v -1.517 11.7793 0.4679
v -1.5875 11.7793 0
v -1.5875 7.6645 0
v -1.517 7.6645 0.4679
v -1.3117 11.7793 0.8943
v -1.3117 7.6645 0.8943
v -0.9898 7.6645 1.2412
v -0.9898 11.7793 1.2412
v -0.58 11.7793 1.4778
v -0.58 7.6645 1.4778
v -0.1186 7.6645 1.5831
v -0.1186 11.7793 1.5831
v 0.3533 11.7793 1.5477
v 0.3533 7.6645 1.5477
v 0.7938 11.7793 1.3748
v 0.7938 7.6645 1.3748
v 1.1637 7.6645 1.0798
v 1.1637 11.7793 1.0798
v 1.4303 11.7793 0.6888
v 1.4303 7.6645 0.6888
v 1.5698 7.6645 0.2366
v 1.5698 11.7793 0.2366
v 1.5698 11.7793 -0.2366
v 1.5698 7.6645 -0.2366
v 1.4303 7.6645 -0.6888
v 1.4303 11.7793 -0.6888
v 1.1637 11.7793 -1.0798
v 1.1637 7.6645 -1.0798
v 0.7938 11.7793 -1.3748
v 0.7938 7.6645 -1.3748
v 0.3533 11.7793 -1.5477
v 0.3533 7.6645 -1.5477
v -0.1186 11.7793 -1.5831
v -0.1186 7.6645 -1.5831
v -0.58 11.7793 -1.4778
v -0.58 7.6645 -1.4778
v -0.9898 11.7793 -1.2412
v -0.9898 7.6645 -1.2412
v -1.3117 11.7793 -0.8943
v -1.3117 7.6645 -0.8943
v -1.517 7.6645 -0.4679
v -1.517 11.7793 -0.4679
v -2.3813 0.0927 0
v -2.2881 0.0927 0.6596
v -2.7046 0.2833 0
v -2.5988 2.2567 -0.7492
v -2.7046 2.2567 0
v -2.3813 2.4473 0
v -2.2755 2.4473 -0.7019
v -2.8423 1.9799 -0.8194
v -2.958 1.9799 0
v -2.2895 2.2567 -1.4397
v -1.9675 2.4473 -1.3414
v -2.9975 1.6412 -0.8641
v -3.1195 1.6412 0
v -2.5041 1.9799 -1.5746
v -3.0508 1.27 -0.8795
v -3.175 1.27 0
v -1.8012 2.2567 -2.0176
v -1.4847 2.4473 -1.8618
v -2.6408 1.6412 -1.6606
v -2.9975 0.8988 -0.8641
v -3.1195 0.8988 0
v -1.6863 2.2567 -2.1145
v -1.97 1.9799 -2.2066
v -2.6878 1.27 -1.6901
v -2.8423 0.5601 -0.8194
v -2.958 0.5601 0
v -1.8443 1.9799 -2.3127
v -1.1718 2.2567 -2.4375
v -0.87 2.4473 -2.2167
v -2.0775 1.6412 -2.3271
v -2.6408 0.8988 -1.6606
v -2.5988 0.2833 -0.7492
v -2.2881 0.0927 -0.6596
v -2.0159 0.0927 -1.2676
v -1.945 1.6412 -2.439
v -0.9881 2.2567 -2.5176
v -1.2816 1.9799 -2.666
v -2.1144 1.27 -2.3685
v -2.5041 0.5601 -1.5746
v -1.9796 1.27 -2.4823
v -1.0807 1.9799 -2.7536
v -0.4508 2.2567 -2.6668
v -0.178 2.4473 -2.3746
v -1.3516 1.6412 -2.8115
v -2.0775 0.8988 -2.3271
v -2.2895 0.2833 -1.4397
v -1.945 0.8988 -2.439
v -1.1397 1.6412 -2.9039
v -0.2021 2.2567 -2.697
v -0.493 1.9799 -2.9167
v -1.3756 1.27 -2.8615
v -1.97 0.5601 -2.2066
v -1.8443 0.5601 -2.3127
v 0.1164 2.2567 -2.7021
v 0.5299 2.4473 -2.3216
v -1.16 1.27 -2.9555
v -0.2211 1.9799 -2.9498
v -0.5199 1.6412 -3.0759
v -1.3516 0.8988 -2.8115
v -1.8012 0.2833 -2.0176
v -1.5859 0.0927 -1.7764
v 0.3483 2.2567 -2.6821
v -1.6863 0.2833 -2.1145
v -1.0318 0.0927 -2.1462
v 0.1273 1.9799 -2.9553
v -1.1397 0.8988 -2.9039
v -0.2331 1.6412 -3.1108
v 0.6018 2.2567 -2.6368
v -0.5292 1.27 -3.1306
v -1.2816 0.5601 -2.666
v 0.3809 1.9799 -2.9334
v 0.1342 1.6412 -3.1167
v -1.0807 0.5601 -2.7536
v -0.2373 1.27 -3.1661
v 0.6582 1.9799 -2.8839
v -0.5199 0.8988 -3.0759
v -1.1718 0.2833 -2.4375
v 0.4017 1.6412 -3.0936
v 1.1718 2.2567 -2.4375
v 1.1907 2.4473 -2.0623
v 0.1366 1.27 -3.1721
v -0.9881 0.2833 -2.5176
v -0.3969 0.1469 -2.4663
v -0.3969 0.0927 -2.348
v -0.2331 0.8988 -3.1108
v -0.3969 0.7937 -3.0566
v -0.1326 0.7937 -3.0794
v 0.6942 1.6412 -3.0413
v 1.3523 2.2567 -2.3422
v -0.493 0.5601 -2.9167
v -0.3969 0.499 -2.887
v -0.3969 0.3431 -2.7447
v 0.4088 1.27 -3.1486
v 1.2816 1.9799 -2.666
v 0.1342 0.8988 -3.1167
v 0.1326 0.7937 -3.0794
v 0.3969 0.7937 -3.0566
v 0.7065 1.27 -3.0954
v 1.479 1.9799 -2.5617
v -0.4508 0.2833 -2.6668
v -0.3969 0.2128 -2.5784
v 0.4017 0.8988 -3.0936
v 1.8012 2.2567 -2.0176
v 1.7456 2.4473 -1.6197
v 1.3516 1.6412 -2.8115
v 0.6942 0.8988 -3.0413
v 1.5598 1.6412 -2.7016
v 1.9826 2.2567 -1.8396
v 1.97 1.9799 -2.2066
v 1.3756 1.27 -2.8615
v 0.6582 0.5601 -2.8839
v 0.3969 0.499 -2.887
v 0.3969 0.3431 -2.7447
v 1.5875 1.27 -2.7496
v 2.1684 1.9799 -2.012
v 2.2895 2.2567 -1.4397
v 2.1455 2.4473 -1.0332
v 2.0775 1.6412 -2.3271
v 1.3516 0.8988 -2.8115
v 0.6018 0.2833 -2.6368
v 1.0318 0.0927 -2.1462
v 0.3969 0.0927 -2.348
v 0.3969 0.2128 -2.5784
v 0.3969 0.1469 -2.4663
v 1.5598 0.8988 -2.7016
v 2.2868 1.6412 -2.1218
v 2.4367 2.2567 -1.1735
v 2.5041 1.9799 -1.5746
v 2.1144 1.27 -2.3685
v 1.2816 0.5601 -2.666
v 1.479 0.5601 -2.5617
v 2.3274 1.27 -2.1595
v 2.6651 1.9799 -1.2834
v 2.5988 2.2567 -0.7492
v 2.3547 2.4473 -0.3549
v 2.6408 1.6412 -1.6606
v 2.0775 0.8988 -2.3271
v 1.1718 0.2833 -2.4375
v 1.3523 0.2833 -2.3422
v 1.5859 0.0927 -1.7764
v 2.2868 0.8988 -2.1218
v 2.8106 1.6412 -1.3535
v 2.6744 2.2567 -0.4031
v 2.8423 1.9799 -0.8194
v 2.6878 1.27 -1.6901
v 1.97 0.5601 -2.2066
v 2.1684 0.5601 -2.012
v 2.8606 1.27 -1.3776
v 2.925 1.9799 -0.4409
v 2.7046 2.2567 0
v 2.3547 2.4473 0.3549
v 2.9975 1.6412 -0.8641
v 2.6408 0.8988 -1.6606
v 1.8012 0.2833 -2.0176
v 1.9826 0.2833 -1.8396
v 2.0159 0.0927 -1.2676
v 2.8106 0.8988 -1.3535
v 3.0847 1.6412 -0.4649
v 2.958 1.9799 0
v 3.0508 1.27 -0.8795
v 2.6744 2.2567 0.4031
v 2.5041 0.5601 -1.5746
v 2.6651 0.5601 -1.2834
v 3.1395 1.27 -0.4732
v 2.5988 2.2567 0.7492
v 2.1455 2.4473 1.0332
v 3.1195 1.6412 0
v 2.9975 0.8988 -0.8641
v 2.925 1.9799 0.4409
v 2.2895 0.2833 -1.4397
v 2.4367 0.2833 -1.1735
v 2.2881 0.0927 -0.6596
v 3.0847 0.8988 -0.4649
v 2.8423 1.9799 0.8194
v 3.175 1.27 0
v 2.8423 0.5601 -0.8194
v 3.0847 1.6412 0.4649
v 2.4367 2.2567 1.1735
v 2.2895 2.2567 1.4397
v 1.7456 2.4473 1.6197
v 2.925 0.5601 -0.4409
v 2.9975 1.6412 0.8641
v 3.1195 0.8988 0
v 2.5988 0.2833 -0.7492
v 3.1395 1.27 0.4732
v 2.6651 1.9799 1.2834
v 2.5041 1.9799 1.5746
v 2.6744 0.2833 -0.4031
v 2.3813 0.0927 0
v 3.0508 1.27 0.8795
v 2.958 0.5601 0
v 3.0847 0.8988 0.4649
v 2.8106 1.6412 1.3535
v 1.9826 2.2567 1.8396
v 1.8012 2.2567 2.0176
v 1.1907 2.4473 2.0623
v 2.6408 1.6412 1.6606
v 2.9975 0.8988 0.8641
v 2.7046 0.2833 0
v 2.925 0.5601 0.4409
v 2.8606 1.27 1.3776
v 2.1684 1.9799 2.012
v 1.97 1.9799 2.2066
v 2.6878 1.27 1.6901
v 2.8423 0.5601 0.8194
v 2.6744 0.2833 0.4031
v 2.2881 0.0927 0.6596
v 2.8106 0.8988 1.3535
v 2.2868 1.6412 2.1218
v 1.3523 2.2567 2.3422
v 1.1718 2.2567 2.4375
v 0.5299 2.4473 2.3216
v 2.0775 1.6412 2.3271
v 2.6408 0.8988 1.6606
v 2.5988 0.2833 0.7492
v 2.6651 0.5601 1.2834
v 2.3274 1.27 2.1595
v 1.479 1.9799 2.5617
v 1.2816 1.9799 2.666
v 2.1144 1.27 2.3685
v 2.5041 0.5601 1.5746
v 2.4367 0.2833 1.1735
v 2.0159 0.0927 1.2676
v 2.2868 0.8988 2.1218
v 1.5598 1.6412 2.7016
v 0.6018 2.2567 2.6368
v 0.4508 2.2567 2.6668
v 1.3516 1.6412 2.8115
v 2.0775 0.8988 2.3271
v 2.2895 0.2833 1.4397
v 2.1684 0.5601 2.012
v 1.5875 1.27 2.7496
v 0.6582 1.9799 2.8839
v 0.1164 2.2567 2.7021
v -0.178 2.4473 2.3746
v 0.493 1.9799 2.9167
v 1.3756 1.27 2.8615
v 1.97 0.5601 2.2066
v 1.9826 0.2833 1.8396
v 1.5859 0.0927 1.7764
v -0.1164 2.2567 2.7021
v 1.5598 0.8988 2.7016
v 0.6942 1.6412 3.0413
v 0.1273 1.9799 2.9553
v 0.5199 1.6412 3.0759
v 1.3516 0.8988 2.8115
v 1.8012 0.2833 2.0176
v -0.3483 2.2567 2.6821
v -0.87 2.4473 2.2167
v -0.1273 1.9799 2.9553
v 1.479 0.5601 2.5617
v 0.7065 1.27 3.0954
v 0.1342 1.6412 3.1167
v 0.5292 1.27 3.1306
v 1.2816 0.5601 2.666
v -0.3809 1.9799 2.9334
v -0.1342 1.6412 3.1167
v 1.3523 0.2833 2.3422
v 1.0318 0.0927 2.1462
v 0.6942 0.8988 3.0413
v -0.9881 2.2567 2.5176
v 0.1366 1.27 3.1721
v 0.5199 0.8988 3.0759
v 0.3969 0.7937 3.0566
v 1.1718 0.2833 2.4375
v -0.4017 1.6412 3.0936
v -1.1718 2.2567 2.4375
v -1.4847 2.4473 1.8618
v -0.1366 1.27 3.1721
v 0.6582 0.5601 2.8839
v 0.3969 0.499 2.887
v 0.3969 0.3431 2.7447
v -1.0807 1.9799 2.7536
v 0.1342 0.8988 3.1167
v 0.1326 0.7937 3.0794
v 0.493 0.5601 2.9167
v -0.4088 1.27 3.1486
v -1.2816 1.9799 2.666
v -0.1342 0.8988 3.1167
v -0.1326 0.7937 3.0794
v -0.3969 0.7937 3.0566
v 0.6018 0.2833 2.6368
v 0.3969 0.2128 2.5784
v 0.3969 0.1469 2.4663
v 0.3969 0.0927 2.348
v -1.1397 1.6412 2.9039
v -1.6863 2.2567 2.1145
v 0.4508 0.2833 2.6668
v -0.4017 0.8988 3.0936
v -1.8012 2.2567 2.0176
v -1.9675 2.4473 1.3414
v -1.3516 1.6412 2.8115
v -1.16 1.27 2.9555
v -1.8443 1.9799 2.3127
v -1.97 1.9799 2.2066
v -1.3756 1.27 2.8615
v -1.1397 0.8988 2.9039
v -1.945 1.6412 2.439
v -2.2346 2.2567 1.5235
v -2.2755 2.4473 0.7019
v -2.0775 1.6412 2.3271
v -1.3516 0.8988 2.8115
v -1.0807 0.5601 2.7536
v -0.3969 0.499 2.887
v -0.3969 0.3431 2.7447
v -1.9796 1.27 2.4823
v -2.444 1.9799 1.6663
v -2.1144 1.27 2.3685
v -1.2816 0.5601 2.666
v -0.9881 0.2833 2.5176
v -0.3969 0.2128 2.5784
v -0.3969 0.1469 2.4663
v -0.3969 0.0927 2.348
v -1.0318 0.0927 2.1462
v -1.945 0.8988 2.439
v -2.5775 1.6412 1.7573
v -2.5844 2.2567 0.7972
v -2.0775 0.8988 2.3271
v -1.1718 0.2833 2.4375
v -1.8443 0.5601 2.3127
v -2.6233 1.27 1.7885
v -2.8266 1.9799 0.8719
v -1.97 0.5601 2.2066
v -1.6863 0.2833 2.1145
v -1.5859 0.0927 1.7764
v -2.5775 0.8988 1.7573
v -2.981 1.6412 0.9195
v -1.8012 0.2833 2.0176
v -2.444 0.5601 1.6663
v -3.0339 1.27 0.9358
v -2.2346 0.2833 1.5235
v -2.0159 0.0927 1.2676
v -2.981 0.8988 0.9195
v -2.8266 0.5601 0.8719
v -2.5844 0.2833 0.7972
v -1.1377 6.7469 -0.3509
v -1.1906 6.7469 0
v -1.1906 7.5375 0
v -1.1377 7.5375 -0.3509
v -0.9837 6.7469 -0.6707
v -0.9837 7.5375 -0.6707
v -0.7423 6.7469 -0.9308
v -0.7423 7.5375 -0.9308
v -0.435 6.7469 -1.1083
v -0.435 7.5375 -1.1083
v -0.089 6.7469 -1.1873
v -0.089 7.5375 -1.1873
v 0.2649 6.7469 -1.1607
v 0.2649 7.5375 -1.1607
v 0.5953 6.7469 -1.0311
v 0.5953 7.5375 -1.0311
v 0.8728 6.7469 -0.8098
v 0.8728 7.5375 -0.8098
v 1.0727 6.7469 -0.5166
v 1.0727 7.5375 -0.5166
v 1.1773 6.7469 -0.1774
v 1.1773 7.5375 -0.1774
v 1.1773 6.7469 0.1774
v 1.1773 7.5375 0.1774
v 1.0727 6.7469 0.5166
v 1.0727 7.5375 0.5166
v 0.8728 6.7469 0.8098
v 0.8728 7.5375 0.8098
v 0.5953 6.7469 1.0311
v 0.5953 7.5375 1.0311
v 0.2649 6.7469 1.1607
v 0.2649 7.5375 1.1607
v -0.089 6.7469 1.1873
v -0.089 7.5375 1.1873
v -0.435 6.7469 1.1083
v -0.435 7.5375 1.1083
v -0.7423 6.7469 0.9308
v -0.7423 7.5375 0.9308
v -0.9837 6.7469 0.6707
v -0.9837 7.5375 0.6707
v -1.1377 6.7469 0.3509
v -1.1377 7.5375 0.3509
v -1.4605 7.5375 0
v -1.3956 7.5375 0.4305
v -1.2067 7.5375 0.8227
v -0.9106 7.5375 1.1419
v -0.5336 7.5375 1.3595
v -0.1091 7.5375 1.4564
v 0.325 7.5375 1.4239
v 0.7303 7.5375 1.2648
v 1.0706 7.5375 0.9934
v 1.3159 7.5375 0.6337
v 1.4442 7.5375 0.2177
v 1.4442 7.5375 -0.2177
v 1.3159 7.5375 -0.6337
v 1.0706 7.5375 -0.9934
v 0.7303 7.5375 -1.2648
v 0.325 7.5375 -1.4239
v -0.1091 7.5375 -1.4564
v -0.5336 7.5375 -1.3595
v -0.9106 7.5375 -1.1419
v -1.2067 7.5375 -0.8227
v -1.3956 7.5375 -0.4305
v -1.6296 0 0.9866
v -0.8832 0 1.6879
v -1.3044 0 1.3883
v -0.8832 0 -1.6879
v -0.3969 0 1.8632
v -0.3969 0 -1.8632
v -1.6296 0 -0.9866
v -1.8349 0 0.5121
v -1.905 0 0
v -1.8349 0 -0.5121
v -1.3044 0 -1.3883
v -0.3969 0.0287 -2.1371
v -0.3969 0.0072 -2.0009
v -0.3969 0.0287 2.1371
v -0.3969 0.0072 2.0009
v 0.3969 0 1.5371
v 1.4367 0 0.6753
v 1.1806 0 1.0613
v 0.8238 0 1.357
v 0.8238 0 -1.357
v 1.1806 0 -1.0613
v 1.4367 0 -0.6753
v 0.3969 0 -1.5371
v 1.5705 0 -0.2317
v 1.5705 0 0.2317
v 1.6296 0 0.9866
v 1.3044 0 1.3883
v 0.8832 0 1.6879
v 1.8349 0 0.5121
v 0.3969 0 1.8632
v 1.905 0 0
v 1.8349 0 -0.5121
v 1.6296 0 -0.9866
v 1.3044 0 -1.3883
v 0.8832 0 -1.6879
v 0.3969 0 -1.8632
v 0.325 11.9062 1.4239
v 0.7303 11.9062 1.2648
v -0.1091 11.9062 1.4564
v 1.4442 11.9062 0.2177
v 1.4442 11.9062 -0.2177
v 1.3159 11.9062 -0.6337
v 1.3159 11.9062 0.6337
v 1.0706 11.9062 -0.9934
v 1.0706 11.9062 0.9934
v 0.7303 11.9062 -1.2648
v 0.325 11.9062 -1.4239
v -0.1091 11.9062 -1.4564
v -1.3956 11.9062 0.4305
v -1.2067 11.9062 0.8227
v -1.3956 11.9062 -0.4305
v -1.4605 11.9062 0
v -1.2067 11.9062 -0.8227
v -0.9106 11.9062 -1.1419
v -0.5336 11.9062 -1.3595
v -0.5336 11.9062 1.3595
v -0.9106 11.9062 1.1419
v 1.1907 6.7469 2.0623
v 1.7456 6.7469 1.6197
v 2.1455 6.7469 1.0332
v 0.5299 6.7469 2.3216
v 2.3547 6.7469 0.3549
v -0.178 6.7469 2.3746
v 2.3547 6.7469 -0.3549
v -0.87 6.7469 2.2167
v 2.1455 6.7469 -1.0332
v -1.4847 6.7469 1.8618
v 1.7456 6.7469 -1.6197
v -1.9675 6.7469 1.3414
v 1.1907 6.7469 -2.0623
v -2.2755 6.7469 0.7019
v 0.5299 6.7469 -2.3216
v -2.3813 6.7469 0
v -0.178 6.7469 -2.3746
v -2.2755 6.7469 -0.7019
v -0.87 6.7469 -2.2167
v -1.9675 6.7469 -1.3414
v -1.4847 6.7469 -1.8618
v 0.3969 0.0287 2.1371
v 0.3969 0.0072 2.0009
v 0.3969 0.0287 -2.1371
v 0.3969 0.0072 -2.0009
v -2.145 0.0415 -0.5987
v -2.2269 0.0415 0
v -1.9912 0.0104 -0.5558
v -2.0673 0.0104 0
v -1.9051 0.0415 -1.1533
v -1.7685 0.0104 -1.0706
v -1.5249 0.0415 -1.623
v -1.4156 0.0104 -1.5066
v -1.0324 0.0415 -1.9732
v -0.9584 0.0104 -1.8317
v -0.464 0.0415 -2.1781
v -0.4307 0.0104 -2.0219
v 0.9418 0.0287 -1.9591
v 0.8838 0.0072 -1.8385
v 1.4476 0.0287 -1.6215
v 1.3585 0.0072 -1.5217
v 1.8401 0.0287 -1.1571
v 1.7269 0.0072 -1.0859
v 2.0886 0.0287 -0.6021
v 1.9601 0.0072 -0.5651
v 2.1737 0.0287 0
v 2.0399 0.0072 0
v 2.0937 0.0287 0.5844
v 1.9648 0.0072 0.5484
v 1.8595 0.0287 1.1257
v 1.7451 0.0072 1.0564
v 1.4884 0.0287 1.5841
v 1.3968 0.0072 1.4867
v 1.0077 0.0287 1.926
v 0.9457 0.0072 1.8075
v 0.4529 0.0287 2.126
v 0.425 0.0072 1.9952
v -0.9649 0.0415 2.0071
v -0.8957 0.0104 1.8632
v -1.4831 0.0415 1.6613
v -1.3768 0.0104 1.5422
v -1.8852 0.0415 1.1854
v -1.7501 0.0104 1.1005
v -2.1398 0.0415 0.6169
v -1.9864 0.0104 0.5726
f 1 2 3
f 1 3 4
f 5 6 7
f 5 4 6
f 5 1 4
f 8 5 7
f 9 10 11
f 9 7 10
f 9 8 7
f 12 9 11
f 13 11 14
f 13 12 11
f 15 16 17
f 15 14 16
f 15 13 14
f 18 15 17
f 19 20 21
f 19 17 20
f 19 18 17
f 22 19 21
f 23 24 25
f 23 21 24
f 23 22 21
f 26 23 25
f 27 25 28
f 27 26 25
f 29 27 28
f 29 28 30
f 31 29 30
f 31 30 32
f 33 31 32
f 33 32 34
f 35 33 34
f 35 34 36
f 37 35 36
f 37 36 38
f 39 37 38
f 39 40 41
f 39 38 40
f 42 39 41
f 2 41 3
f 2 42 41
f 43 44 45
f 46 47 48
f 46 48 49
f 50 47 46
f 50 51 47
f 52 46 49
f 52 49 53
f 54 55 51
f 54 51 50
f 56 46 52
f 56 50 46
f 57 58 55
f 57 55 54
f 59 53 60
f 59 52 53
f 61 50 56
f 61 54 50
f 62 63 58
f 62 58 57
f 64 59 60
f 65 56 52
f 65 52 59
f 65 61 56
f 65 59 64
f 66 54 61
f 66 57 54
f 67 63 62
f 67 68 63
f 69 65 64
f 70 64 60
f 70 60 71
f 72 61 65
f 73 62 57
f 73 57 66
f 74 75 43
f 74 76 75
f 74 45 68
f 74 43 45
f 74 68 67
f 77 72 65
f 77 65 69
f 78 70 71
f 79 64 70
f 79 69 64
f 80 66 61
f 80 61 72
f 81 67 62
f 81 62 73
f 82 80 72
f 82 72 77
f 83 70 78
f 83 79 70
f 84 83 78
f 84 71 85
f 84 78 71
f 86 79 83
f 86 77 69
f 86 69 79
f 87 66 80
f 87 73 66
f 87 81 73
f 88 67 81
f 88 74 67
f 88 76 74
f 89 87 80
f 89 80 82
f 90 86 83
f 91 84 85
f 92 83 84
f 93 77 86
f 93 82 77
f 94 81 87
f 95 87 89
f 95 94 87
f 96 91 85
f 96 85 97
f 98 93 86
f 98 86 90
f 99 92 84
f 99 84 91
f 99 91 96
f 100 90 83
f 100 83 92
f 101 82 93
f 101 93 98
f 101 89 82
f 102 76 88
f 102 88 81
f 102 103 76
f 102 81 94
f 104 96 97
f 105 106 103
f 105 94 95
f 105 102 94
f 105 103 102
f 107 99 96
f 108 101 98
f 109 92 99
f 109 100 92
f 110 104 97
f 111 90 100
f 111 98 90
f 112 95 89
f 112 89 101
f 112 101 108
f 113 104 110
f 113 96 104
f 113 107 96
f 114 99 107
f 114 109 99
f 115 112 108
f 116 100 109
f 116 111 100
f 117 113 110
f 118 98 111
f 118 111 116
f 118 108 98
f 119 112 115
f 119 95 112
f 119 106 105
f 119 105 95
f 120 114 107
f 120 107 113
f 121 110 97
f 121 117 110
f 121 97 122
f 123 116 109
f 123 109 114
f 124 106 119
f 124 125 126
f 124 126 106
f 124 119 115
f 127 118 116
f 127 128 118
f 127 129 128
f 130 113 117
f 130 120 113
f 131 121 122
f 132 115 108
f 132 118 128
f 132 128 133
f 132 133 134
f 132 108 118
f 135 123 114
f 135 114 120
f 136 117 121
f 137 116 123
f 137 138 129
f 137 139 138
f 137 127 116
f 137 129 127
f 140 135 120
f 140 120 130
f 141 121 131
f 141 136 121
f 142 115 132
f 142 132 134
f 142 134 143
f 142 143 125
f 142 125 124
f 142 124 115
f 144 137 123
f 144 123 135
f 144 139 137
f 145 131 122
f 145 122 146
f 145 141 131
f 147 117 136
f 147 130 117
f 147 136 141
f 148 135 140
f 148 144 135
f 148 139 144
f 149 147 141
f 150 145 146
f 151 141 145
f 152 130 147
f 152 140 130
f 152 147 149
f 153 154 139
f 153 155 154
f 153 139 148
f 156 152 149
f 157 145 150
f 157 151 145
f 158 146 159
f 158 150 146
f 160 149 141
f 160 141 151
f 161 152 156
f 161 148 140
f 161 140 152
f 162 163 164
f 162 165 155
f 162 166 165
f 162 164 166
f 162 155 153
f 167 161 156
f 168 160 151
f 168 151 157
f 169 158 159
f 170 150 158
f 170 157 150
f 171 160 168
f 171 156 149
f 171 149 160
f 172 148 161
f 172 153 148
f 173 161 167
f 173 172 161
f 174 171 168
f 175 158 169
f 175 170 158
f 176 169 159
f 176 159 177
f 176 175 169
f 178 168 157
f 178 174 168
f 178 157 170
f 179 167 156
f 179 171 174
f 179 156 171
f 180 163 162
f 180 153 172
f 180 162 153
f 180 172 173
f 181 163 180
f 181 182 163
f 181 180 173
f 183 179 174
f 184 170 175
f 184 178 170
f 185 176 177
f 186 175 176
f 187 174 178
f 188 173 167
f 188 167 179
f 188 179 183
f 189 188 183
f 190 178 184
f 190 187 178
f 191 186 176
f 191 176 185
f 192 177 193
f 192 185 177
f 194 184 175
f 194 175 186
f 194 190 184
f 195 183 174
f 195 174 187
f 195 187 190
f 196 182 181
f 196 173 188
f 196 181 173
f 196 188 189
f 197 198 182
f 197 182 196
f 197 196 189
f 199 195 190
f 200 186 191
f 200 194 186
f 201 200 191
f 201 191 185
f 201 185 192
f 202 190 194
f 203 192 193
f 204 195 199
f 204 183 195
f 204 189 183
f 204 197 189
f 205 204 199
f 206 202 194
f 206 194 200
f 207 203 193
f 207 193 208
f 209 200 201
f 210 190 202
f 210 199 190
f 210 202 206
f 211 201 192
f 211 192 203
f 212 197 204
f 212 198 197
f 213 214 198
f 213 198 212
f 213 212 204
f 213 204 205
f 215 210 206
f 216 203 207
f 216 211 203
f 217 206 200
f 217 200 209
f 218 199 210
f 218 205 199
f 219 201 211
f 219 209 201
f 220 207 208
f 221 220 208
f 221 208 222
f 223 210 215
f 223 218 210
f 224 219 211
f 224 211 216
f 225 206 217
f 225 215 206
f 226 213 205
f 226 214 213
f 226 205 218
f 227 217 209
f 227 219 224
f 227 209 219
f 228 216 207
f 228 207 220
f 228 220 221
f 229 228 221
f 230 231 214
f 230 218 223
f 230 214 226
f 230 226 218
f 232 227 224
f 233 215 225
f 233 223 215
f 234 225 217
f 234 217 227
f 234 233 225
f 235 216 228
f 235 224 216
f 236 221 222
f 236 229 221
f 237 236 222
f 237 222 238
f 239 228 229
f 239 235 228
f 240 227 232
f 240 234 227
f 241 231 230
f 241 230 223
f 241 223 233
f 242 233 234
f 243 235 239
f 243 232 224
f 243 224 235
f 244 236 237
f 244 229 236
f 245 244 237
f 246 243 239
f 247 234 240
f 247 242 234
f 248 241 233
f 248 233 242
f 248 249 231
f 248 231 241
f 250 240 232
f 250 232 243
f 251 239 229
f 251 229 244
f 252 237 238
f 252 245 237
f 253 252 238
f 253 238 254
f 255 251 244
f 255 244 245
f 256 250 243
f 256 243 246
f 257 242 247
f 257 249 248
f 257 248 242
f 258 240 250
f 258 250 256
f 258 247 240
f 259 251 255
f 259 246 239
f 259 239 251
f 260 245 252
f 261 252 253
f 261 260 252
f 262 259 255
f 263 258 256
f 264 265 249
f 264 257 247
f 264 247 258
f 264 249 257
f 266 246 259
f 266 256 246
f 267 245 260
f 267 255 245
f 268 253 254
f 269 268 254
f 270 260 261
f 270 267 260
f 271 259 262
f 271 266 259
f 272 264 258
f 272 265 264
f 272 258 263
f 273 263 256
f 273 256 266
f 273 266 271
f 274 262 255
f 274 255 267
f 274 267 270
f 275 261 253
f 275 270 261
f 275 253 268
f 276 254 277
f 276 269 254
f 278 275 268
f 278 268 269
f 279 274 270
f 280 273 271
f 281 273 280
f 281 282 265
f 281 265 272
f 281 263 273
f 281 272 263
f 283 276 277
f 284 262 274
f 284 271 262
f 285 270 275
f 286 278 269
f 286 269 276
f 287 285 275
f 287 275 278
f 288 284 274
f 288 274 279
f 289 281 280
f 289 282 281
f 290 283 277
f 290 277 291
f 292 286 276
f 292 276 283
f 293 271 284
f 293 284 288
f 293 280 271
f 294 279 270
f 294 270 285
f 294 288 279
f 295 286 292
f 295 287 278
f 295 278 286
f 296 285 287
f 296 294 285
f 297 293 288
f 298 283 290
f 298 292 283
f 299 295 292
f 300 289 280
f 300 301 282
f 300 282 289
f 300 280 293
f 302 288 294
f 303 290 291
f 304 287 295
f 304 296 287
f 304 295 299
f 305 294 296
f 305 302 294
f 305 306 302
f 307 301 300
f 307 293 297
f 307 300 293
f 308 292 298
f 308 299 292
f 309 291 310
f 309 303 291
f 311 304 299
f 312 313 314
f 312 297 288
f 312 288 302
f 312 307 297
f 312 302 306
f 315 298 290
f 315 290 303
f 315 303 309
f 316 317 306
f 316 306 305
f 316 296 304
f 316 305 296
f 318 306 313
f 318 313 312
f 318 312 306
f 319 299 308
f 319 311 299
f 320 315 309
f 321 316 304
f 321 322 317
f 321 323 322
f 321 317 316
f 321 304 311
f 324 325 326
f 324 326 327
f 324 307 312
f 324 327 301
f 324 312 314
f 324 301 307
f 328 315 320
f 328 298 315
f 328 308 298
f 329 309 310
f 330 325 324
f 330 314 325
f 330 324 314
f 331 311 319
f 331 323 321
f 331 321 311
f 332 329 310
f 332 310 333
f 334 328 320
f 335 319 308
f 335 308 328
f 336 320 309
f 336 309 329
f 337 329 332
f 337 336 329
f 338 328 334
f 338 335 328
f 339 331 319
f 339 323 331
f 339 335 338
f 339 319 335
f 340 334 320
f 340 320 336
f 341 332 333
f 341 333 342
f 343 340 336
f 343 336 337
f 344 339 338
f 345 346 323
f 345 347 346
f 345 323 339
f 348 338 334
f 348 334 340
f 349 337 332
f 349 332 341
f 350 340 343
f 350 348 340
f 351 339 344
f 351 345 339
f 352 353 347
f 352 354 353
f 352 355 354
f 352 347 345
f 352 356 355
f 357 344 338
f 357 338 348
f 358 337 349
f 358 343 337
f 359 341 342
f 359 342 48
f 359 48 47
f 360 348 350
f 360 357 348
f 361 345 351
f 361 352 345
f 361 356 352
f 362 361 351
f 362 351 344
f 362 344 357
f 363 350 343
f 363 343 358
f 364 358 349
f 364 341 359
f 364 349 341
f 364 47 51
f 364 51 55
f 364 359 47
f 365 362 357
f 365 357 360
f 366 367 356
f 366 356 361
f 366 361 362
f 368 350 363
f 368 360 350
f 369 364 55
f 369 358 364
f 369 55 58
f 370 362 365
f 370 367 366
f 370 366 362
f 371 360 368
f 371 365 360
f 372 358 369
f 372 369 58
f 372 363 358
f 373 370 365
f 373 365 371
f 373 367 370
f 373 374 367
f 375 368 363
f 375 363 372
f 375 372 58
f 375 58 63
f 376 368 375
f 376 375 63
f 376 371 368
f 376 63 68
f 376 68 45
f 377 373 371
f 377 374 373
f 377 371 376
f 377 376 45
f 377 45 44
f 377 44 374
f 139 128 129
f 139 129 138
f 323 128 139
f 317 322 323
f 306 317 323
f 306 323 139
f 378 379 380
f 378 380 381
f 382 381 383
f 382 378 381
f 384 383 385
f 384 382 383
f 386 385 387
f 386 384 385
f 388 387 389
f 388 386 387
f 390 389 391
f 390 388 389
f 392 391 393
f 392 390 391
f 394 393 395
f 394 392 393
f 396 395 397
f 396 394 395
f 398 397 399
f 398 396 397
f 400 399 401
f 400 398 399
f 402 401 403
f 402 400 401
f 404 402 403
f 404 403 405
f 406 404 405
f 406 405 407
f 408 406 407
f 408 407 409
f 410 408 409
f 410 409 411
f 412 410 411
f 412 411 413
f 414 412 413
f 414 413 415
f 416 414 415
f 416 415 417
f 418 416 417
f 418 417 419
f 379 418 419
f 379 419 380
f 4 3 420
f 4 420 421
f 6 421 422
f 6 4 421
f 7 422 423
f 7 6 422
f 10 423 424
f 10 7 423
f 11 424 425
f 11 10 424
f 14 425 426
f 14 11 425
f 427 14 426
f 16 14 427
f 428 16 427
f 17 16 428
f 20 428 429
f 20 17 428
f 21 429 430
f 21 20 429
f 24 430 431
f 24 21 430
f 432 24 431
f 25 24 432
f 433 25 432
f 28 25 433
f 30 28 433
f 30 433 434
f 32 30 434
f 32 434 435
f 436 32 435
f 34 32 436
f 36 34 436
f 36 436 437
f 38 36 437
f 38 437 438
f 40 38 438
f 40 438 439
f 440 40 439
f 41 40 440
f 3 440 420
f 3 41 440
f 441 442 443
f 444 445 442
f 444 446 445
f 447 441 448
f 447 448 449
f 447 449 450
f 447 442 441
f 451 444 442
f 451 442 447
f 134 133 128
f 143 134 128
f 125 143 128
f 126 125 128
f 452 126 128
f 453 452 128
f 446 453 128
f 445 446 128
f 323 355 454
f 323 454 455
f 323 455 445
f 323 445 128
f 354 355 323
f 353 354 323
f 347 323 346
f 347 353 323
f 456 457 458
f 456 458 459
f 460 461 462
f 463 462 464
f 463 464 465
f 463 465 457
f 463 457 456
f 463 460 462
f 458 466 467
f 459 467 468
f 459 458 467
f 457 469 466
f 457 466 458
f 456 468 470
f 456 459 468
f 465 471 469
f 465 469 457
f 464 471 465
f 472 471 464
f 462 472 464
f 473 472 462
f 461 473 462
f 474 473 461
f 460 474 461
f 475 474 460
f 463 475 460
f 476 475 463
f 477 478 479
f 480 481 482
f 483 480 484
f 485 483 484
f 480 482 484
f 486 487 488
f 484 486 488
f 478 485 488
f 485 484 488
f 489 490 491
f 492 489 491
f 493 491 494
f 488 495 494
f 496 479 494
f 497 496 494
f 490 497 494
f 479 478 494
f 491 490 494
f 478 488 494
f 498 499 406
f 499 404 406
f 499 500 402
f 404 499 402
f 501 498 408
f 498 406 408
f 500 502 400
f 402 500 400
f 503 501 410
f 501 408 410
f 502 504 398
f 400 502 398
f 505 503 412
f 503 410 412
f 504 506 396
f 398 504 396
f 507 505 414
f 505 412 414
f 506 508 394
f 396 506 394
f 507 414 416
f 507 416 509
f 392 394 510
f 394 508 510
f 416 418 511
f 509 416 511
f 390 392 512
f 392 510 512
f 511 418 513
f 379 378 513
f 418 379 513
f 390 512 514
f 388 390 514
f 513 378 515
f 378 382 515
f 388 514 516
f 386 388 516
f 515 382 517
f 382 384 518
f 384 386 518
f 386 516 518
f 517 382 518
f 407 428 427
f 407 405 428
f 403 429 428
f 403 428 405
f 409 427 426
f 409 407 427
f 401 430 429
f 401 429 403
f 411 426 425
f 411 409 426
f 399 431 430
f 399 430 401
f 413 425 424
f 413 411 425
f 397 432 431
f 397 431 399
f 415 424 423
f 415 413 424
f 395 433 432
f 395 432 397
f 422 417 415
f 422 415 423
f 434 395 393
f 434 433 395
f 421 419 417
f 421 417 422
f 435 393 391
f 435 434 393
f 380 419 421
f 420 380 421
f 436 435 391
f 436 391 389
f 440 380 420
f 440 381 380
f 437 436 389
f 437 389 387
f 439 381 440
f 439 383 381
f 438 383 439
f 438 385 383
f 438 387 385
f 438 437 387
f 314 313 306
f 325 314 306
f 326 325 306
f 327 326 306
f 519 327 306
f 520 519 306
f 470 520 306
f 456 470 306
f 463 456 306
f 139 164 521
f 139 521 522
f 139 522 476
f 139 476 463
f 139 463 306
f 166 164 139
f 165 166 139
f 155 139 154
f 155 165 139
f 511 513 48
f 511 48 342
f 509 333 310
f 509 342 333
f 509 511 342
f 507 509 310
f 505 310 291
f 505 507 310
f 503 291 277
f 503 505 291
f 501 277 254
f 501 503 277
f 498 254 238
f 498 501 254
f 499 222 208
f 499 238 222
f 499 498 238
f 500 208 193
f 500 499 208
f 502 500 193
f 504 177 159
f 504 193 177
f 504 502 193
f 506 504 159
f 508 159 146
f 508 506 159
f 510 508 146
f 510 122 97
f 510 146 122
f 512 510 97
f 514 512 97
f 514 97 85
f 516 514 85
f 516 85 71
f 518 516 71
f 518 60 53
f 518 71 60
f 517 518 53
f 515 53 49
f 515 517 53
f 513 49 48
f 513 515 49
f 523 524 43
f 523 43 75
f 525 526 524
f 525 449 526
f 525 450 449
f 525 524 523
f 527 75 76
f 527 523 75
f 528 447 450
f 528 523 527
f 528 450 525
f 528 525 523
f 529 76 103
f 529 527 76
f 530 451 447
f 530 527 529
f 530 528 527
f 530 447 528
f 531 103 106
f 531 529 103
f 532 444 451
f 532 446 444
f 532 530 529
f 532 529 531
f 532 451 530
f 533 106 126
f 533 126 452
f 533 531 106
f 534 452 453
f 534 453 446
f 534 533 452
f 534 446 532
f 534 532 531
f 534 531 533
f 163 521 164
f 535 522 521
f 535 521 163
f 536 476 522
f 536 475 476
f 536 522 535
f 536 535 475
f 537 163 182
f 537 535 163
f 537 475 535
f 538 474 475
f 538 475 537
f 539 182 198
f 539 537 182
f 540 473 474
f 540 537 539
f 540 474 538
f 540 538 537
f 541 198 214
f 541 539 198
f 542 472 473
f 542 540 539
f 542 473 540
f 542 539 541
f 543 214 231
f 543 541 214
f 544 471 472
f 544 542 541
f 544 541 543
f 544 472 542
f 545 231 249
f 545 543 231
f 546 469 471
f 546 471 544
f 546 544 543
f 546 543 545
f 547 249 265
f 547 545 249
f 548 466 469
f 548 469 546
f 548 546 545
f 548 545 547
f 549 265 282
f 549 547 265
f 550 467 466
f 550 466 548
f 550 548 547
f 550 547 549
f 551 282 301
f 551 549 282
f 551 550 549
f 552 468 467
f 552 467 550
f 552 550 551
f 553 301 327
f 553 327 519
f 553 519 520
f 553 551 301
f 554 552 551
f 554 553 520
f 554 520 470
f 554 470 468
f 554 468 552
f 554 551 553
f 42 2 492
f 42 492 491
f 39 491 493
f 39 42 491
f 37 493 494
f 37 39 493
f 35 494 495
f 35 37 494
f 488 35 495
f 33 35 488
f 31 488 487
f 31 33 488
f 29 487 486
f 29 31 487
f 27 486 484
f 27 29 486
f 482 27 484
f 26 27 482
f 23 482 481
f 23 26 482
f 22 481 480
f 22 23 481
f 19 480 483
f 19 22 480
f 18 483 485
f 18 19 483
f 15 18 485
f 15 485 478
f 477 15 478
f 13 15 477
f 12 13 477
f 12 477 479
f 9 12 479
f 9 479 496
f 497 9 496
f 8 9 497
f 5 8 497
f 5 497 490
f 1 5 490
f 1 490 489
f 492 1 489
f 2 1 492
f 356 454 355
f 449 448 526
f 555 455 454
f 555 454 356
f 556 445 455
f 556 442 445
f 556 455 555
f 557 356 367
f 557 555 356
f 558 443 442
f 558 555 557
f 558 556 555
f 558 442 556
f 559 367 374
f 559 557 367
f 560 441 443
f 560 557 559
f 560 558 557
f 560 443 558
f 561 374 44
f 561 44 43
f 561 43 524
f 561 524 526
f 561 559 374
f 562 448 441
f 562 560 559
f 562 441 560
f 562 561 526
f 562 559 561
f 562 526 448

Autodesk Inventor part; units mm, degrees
ref_plane "YZ Plane" through (0, 0, 0) normal (1, 0, 0) x (0, 1, 0)
ref_plane "XZ Plane" through (0, 0, 0) normal (0, 1, 0) x (-1, 0, 0)
ref_plane "XY Plane" through (0, 0, 0) normal (0, 0, 1) x (1, 0, 0)
sketch "Boceto1" plane through (0, 0, 0) normal (0, 0, 1) x (1, 0, 0)
  line L0 (0, 0) -> (-1.5875, 0)
  line L1 (-1.4605, 11.9062) -> (0, 11.9062)
  line L2 (0, 11.9062) -> (0, 0)
  line L3 (-1.4605, 11.9062) -> (-1.5875, 11.7793)
  line L4 (-1.1906, 7.5375) -> (-1.1906, 6.7437)
  line L5 (-1.4605, 7.5375) -> (-1.1906, 7.5375)
  line L6 (-1.5875, 7.6645) -> (-1.5875, 11.7793)
  line L7 (-1.5875, 7.6645) -> (-1.4605, 7.5375)
  line L8 (0, 0) -> (-1.905, 0)
  line L9 (-2.3813, 6.7469) -> (-1.1906, 6.7469)
  line L10 (0, 6.7469) -> (0, 0)
  arc A0 (-2.3813, 2.4473) -> (-1.905, 0) centre (-1.905, 1.27) ccw
  line L11 (-2.3813, 0) -> (-2.3813, 0.0927)
  line L12 (-2.3813, 2.4473) -> (-2.3813, 6.7469)
  point P0 (-1.5875, 11.9062)
  point P1 (-1.5875, 7.5375)
  dimension "d0" = 1.5875
  dimension "d1" = 11.9062
  dimension "d2" = 0.127
  dimension "d3" = 0.127
  dimension "d5" = 0.7937
  dimension "d7" = 4.3688
  dimension "d8" = 0.127
  dimension "d9" = 0.127
  dimension "d10" = 2.3813
  dimension "d11" = 6.7469
  dimension "d12" = 2.54
  dimension "d13" = 1.27
  dimension "d14" = 1.905
revolve "Revolución1" add sketch "Boceto1" angle 360 about axis through (0, 11.9062, 0) along (0, -1, 0)
thread "Rosca1" size "5-40 UNC" class "2A" standard "ANSI Unified Screw Threads" full length
sketch "Boceto2" plane through (0, 0, 0) normal (0, -1, 0) x (1, 0, 0)
  line L0 (-0.3969, 3.9709) -> (0.3969, 3.9709)
  line L1 (0.3969, 3.9709) -> (0.3969, -4.5285)
  line L2 (0.3969, -4.5285) -> (-0.3969, -4.5285)
  line L3 (-0.3969, -4.5285) -> (-0.3969, 3.9709)
  point P0 (0, 0)
  dimension "d18" = 0.7937
  dimension "d19" = 0.3969
extrude "Extrusión1" cut sketch "Boceto2" against normal blind 0.7937
equation "\"d3\" = d2"
equation "\"d7\" = d4"
equation "\"d9\" = d8"
equation "\"d19\" = 0.5 * d18"
equation "\"d4\" = 4.3688"
properties part number "Crank Screw" material "Acero inoxidable"
